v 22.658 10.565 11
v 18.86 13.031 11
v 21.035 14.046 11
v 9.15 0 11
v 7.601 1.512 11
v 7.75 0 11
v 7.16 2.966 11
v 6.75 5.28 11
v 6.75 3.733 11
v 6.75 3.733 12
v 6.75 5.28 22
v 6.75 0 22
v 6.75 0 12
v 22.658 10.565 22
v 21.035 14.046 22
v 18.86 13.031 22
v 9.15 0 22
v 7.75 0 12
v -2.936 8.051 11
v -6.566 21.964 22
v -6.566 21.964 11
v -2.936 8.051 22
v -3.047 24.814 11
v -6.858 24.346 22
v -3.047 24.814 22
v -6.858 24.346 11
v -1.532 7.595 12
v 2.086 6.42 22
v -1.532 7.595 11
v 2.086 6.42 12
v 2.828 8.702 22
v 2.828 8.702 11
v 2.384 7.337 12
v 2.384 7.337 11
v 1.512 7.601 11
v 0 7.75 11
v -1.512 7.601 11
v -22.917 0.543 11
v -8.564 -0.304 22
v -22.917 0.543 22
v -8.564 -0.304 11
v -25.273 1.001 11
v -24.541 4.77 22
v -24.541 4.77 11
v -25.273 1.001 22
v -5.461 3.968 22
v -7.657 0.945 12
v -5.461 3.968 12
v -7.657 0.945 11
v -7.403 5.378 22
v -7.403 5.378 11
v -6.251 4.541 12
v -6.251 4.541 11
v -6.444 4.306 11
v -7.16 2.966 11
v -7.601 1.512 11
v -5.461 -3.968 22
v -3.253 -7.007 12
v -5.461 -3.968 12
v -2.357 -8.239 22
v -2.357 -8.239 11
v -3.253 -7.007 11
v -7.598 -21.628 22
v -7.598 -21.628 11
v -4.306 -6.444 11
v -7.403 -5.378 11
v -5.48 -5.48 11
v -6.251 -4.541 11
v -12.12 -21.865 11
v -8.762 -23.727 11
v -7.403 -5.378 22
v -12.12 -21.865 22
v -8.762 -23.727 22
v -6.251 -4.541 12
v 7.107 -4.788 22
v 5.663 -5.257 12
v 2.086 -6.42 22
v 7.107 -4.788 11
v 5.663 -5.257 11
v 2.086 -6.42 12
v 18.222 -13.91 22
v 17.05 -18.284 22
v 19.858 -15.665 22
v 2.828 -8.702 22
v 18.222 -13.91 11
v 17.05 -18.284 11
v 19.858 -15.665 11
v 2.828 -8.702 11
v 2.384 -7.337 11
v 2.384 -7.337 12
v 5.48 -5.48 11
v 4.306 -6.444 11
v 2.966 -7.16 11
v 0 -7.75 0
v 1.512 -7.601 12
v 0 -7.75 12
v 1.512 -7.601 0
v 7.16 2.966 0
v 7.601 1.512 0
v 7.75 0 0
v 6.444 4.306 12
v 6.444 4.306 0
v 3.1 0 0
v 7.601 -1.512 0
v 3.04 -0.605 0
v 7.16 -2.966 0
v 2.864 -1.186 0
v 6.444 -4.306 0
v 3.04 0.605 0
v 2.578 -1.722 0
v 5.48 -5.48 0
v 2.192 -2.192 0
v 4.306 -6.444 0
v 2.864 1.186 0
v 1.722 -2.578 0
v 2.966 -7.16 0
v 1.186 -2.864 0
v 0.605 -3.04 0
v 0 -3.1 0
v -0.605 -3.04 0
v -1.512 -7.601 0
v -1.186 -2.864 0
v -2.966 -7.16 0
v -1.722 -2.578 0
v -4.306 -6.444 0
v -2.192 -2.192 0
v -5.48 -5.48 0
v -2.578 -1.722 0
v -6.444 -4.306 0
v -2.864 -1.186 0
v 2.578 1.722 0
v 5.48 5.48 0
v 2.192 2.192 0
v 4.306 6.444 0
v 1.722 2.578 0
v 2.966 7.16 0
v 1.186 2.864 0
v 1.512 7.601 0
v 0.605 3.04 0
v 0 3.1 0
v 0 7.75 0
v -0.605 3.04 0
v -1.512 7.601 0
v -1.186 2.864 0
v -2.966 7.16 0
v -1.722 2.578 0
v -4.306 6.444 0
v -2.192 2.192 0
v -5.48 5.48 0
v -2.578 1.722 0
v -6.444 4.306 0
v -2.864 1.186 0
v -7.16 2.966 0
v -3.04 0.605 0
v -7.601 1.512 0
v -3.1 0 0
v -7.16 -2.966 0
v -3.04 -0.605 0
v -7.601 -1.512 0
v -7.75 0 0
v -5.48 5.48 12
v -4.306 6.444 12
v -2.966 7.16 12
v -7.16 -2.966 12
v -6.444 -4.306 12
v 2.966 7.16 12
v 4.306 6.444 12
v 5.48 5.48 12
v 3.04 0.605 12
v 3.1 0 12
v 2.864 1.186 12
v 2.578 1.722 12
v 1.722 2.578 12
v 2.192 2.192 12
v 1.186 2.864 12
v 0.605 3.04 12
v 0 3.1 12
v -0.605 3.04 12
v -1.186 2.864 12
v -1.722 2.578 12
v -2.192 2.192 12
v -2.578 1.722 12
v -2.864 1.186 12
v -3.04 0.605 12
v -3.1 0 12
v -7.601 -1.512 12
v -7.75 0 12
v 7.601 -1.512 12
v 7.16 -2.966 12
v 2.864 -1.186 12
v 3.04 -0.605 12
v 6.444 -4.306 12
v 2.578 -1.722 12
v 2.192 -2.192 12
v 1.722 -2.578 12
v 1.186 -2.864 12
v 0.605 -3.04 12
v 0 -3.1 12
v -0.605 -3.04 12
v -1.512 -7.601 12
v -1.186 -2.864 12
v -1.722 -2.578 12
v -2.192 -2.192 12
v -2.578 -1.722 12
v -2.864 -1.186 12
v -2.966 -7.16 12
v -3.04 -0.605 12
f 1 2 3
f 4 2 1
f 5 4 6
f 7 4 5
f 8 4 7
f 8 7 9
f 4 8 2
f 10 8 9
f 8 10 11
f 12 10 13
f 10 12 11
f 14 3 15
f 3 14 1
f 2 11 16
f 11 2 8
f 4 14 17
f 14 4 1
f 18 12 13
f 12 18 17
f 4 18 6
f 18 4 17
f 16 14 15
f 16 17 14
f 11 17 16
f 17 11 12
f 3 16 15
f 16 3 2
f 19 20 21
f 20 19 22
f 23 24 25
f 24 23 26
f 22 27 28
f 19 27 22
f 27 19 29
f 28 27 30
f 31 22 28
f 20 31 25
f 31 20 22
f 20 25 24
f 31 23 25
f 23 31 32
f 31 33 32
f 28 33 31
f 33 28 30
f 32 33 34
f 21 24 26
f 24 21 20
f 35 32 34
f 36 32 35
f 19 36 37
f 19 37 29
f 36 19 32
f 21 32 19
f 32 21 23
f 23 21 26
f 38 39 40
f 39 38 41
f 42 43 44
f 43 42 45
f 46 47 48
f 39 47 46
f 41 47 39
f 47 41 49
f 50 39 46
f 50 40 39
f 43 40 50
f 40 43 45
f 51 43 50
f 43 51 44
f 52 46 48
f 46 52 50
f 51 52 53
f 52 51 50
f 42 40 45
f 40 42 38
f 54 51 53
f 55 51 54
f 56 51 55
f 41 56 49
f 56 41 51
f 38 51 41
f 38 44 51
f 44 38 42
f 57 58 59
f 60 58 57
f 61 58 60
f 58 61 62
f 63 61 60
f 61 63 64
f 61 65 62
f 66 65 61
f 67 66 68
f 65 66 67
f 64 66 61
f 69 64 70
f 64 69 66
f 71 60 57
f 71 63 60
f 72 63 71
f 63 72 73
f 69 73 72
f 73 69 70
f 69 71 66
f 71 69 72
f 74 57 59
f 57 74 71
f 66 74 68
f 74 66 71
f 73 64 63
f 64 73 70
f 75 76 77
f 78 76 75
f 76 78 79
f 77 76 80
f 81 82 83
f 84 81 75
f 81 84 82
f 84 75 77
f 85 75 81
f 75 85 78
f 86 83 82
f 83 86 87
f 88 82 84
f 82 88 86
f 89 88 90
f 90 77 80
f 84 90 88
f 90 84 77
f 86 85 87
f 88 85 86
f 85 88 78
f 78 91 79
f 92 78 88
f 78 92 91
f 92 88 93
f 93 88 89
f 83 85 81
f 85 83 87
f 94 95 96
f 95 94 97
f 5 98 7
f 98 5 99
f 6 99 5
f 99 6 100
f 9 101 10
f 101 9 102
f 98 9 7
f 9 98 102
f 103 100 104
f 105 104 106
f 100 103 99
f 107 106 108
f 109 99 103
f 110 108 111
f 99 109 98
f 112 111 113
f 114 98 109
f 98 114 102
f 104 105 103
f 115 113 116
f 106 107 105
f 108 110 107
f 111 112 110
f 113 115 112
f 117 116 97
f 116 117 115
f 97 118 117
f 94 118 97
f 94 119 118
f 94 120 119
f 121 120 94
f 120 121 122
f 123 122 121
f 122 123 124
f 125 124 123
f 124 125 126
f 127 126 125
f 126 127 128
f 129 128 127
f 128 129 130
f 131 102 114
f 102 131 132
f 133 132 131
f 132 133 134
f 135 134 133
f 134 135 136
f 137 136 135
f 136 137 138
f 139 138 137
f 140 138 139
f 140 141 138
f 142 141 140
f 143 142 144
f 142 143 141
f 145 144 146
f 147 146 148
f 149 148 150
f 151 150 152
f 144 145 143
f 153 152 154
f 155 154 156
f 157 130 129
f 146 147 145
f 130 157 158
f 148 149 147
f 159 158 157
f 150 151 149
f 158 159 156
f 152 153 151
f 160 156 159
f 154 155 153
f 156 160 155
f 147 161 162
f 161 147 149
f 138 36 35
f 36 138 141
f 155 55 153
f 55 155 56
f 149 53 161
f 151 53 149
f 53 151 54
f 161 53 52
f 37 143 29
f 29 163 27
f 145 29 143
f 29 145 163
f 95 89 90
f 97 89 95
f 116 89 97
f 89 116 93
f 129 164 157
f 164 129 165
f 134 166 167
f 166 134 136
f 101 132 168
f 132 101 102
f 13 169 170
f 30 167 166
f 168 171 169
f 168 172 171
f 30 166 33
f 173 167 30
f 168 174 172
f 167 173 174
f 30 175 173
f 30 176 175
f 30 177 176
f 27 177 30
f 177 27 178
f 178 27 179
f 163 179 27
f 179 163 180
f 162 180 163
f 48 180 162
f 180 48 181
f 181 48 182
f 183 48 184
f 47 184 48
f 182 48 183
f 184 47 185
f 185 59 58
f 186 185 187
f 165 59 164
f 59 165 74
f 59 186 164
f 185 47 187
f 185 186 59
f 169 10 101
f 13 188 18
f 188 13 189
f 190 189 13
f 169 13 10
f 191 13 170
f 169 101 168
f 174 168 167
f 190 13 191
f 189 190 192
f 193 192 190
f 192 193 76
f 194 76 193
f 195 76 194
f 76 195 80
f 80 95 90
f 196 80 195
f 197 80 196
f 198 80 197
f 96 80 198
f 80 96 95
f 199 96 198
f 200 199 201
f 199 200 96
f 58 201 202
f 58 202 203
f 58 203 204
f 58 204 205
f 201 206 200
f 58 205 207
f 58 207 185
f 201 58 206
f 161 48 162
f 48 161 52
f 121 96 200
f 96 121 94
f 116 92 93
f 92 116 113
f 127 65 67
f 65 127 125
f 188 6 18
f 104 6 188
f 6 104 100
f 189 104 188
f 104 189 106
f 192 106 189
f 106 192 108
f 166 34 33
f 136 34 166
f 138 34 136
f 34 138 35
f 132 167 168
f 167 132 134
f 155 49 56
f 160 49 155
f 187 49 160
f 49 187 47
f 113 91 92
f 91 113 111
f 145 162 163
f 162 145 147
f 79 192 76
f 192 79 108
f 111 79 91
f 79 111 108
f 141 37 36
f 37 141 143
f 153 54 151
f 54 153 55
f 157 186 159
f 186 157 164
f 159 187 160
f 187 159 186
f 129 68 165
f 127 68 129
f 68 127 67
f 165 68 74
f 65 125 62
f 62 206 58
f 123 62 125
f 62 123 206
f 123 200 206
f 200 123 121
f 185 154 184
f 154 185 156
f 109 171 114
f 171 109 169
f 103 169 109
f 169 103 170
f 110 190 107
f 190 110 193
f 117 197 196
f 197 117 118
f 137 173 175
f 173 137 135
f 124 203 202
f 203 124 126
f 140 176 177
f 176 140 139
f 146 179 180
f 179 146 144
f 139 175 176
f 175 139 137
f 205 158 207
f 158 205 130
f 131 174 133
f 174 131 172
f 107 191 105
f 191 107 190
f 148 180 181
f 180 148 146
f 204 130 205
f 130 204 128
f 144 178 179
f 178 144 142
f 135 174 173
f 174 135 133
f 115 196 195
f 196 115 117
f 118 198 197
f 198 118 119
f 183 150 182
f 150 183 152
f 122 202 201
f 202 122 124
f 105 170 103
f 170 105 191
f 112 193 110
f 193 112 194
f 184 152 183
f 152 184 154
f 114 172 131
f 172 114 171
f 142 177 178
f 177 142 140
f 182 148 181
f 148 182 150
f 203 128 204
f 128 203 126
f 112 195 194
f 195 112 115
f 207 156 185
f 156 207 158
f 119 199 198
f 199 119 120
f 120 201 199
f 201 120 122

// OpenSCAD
$fn = 32;

// ----------------------------------------------------------------------
// Impeller: 50 mm, 5 blades, 22 mm tall
// ----------------------------------------------------------------------

// --- parameters (mm) ---
boss_d = 15.5;            // hub diameter
boss_h = 12;              // hub height
rotor_d = 50;             // outer diameter over the blades
vane_count = 5;           // number of blades
blade_t = 2.4;            // blade thickness
blade_h = 10;             // blade height
blade_in_r = 6.75;        // blade root radius
blade_out_r = 22.6;       // blade tip radius
sweep = 25;               // blade sweep, degrees
bore_d = 6.2;             // shaft bore

module hub() {
  cylinder(h = boss_h, d = boss_d);
}

module blade() {
  /* blade swept between two boxes: hull of the root and the tip section */
  hull() {
    translate([blade_in_r, 0, boss_h - 1])
      cube([blade_t, blade_t * 2.2, blade_h + 1], center = false);
    rotate([0, 0, sweep])
      translate([blade_out_r, 0, boss_h - 1])
        cube([blade_t, blade_t * 1.6, blade_h + 1], center = false);
  }
}

module blades() {
  for (i = [0 : vane_count - 1])
    rotate([0, 0, i * 360 / vane_count]) blade();
}

difference() {
  union() {
    hub();
    blades();
  }
  translate([0, 0, -1]) cylinder(h = boss_h + blade_h + 0 + 3, d = bore_d);
}
